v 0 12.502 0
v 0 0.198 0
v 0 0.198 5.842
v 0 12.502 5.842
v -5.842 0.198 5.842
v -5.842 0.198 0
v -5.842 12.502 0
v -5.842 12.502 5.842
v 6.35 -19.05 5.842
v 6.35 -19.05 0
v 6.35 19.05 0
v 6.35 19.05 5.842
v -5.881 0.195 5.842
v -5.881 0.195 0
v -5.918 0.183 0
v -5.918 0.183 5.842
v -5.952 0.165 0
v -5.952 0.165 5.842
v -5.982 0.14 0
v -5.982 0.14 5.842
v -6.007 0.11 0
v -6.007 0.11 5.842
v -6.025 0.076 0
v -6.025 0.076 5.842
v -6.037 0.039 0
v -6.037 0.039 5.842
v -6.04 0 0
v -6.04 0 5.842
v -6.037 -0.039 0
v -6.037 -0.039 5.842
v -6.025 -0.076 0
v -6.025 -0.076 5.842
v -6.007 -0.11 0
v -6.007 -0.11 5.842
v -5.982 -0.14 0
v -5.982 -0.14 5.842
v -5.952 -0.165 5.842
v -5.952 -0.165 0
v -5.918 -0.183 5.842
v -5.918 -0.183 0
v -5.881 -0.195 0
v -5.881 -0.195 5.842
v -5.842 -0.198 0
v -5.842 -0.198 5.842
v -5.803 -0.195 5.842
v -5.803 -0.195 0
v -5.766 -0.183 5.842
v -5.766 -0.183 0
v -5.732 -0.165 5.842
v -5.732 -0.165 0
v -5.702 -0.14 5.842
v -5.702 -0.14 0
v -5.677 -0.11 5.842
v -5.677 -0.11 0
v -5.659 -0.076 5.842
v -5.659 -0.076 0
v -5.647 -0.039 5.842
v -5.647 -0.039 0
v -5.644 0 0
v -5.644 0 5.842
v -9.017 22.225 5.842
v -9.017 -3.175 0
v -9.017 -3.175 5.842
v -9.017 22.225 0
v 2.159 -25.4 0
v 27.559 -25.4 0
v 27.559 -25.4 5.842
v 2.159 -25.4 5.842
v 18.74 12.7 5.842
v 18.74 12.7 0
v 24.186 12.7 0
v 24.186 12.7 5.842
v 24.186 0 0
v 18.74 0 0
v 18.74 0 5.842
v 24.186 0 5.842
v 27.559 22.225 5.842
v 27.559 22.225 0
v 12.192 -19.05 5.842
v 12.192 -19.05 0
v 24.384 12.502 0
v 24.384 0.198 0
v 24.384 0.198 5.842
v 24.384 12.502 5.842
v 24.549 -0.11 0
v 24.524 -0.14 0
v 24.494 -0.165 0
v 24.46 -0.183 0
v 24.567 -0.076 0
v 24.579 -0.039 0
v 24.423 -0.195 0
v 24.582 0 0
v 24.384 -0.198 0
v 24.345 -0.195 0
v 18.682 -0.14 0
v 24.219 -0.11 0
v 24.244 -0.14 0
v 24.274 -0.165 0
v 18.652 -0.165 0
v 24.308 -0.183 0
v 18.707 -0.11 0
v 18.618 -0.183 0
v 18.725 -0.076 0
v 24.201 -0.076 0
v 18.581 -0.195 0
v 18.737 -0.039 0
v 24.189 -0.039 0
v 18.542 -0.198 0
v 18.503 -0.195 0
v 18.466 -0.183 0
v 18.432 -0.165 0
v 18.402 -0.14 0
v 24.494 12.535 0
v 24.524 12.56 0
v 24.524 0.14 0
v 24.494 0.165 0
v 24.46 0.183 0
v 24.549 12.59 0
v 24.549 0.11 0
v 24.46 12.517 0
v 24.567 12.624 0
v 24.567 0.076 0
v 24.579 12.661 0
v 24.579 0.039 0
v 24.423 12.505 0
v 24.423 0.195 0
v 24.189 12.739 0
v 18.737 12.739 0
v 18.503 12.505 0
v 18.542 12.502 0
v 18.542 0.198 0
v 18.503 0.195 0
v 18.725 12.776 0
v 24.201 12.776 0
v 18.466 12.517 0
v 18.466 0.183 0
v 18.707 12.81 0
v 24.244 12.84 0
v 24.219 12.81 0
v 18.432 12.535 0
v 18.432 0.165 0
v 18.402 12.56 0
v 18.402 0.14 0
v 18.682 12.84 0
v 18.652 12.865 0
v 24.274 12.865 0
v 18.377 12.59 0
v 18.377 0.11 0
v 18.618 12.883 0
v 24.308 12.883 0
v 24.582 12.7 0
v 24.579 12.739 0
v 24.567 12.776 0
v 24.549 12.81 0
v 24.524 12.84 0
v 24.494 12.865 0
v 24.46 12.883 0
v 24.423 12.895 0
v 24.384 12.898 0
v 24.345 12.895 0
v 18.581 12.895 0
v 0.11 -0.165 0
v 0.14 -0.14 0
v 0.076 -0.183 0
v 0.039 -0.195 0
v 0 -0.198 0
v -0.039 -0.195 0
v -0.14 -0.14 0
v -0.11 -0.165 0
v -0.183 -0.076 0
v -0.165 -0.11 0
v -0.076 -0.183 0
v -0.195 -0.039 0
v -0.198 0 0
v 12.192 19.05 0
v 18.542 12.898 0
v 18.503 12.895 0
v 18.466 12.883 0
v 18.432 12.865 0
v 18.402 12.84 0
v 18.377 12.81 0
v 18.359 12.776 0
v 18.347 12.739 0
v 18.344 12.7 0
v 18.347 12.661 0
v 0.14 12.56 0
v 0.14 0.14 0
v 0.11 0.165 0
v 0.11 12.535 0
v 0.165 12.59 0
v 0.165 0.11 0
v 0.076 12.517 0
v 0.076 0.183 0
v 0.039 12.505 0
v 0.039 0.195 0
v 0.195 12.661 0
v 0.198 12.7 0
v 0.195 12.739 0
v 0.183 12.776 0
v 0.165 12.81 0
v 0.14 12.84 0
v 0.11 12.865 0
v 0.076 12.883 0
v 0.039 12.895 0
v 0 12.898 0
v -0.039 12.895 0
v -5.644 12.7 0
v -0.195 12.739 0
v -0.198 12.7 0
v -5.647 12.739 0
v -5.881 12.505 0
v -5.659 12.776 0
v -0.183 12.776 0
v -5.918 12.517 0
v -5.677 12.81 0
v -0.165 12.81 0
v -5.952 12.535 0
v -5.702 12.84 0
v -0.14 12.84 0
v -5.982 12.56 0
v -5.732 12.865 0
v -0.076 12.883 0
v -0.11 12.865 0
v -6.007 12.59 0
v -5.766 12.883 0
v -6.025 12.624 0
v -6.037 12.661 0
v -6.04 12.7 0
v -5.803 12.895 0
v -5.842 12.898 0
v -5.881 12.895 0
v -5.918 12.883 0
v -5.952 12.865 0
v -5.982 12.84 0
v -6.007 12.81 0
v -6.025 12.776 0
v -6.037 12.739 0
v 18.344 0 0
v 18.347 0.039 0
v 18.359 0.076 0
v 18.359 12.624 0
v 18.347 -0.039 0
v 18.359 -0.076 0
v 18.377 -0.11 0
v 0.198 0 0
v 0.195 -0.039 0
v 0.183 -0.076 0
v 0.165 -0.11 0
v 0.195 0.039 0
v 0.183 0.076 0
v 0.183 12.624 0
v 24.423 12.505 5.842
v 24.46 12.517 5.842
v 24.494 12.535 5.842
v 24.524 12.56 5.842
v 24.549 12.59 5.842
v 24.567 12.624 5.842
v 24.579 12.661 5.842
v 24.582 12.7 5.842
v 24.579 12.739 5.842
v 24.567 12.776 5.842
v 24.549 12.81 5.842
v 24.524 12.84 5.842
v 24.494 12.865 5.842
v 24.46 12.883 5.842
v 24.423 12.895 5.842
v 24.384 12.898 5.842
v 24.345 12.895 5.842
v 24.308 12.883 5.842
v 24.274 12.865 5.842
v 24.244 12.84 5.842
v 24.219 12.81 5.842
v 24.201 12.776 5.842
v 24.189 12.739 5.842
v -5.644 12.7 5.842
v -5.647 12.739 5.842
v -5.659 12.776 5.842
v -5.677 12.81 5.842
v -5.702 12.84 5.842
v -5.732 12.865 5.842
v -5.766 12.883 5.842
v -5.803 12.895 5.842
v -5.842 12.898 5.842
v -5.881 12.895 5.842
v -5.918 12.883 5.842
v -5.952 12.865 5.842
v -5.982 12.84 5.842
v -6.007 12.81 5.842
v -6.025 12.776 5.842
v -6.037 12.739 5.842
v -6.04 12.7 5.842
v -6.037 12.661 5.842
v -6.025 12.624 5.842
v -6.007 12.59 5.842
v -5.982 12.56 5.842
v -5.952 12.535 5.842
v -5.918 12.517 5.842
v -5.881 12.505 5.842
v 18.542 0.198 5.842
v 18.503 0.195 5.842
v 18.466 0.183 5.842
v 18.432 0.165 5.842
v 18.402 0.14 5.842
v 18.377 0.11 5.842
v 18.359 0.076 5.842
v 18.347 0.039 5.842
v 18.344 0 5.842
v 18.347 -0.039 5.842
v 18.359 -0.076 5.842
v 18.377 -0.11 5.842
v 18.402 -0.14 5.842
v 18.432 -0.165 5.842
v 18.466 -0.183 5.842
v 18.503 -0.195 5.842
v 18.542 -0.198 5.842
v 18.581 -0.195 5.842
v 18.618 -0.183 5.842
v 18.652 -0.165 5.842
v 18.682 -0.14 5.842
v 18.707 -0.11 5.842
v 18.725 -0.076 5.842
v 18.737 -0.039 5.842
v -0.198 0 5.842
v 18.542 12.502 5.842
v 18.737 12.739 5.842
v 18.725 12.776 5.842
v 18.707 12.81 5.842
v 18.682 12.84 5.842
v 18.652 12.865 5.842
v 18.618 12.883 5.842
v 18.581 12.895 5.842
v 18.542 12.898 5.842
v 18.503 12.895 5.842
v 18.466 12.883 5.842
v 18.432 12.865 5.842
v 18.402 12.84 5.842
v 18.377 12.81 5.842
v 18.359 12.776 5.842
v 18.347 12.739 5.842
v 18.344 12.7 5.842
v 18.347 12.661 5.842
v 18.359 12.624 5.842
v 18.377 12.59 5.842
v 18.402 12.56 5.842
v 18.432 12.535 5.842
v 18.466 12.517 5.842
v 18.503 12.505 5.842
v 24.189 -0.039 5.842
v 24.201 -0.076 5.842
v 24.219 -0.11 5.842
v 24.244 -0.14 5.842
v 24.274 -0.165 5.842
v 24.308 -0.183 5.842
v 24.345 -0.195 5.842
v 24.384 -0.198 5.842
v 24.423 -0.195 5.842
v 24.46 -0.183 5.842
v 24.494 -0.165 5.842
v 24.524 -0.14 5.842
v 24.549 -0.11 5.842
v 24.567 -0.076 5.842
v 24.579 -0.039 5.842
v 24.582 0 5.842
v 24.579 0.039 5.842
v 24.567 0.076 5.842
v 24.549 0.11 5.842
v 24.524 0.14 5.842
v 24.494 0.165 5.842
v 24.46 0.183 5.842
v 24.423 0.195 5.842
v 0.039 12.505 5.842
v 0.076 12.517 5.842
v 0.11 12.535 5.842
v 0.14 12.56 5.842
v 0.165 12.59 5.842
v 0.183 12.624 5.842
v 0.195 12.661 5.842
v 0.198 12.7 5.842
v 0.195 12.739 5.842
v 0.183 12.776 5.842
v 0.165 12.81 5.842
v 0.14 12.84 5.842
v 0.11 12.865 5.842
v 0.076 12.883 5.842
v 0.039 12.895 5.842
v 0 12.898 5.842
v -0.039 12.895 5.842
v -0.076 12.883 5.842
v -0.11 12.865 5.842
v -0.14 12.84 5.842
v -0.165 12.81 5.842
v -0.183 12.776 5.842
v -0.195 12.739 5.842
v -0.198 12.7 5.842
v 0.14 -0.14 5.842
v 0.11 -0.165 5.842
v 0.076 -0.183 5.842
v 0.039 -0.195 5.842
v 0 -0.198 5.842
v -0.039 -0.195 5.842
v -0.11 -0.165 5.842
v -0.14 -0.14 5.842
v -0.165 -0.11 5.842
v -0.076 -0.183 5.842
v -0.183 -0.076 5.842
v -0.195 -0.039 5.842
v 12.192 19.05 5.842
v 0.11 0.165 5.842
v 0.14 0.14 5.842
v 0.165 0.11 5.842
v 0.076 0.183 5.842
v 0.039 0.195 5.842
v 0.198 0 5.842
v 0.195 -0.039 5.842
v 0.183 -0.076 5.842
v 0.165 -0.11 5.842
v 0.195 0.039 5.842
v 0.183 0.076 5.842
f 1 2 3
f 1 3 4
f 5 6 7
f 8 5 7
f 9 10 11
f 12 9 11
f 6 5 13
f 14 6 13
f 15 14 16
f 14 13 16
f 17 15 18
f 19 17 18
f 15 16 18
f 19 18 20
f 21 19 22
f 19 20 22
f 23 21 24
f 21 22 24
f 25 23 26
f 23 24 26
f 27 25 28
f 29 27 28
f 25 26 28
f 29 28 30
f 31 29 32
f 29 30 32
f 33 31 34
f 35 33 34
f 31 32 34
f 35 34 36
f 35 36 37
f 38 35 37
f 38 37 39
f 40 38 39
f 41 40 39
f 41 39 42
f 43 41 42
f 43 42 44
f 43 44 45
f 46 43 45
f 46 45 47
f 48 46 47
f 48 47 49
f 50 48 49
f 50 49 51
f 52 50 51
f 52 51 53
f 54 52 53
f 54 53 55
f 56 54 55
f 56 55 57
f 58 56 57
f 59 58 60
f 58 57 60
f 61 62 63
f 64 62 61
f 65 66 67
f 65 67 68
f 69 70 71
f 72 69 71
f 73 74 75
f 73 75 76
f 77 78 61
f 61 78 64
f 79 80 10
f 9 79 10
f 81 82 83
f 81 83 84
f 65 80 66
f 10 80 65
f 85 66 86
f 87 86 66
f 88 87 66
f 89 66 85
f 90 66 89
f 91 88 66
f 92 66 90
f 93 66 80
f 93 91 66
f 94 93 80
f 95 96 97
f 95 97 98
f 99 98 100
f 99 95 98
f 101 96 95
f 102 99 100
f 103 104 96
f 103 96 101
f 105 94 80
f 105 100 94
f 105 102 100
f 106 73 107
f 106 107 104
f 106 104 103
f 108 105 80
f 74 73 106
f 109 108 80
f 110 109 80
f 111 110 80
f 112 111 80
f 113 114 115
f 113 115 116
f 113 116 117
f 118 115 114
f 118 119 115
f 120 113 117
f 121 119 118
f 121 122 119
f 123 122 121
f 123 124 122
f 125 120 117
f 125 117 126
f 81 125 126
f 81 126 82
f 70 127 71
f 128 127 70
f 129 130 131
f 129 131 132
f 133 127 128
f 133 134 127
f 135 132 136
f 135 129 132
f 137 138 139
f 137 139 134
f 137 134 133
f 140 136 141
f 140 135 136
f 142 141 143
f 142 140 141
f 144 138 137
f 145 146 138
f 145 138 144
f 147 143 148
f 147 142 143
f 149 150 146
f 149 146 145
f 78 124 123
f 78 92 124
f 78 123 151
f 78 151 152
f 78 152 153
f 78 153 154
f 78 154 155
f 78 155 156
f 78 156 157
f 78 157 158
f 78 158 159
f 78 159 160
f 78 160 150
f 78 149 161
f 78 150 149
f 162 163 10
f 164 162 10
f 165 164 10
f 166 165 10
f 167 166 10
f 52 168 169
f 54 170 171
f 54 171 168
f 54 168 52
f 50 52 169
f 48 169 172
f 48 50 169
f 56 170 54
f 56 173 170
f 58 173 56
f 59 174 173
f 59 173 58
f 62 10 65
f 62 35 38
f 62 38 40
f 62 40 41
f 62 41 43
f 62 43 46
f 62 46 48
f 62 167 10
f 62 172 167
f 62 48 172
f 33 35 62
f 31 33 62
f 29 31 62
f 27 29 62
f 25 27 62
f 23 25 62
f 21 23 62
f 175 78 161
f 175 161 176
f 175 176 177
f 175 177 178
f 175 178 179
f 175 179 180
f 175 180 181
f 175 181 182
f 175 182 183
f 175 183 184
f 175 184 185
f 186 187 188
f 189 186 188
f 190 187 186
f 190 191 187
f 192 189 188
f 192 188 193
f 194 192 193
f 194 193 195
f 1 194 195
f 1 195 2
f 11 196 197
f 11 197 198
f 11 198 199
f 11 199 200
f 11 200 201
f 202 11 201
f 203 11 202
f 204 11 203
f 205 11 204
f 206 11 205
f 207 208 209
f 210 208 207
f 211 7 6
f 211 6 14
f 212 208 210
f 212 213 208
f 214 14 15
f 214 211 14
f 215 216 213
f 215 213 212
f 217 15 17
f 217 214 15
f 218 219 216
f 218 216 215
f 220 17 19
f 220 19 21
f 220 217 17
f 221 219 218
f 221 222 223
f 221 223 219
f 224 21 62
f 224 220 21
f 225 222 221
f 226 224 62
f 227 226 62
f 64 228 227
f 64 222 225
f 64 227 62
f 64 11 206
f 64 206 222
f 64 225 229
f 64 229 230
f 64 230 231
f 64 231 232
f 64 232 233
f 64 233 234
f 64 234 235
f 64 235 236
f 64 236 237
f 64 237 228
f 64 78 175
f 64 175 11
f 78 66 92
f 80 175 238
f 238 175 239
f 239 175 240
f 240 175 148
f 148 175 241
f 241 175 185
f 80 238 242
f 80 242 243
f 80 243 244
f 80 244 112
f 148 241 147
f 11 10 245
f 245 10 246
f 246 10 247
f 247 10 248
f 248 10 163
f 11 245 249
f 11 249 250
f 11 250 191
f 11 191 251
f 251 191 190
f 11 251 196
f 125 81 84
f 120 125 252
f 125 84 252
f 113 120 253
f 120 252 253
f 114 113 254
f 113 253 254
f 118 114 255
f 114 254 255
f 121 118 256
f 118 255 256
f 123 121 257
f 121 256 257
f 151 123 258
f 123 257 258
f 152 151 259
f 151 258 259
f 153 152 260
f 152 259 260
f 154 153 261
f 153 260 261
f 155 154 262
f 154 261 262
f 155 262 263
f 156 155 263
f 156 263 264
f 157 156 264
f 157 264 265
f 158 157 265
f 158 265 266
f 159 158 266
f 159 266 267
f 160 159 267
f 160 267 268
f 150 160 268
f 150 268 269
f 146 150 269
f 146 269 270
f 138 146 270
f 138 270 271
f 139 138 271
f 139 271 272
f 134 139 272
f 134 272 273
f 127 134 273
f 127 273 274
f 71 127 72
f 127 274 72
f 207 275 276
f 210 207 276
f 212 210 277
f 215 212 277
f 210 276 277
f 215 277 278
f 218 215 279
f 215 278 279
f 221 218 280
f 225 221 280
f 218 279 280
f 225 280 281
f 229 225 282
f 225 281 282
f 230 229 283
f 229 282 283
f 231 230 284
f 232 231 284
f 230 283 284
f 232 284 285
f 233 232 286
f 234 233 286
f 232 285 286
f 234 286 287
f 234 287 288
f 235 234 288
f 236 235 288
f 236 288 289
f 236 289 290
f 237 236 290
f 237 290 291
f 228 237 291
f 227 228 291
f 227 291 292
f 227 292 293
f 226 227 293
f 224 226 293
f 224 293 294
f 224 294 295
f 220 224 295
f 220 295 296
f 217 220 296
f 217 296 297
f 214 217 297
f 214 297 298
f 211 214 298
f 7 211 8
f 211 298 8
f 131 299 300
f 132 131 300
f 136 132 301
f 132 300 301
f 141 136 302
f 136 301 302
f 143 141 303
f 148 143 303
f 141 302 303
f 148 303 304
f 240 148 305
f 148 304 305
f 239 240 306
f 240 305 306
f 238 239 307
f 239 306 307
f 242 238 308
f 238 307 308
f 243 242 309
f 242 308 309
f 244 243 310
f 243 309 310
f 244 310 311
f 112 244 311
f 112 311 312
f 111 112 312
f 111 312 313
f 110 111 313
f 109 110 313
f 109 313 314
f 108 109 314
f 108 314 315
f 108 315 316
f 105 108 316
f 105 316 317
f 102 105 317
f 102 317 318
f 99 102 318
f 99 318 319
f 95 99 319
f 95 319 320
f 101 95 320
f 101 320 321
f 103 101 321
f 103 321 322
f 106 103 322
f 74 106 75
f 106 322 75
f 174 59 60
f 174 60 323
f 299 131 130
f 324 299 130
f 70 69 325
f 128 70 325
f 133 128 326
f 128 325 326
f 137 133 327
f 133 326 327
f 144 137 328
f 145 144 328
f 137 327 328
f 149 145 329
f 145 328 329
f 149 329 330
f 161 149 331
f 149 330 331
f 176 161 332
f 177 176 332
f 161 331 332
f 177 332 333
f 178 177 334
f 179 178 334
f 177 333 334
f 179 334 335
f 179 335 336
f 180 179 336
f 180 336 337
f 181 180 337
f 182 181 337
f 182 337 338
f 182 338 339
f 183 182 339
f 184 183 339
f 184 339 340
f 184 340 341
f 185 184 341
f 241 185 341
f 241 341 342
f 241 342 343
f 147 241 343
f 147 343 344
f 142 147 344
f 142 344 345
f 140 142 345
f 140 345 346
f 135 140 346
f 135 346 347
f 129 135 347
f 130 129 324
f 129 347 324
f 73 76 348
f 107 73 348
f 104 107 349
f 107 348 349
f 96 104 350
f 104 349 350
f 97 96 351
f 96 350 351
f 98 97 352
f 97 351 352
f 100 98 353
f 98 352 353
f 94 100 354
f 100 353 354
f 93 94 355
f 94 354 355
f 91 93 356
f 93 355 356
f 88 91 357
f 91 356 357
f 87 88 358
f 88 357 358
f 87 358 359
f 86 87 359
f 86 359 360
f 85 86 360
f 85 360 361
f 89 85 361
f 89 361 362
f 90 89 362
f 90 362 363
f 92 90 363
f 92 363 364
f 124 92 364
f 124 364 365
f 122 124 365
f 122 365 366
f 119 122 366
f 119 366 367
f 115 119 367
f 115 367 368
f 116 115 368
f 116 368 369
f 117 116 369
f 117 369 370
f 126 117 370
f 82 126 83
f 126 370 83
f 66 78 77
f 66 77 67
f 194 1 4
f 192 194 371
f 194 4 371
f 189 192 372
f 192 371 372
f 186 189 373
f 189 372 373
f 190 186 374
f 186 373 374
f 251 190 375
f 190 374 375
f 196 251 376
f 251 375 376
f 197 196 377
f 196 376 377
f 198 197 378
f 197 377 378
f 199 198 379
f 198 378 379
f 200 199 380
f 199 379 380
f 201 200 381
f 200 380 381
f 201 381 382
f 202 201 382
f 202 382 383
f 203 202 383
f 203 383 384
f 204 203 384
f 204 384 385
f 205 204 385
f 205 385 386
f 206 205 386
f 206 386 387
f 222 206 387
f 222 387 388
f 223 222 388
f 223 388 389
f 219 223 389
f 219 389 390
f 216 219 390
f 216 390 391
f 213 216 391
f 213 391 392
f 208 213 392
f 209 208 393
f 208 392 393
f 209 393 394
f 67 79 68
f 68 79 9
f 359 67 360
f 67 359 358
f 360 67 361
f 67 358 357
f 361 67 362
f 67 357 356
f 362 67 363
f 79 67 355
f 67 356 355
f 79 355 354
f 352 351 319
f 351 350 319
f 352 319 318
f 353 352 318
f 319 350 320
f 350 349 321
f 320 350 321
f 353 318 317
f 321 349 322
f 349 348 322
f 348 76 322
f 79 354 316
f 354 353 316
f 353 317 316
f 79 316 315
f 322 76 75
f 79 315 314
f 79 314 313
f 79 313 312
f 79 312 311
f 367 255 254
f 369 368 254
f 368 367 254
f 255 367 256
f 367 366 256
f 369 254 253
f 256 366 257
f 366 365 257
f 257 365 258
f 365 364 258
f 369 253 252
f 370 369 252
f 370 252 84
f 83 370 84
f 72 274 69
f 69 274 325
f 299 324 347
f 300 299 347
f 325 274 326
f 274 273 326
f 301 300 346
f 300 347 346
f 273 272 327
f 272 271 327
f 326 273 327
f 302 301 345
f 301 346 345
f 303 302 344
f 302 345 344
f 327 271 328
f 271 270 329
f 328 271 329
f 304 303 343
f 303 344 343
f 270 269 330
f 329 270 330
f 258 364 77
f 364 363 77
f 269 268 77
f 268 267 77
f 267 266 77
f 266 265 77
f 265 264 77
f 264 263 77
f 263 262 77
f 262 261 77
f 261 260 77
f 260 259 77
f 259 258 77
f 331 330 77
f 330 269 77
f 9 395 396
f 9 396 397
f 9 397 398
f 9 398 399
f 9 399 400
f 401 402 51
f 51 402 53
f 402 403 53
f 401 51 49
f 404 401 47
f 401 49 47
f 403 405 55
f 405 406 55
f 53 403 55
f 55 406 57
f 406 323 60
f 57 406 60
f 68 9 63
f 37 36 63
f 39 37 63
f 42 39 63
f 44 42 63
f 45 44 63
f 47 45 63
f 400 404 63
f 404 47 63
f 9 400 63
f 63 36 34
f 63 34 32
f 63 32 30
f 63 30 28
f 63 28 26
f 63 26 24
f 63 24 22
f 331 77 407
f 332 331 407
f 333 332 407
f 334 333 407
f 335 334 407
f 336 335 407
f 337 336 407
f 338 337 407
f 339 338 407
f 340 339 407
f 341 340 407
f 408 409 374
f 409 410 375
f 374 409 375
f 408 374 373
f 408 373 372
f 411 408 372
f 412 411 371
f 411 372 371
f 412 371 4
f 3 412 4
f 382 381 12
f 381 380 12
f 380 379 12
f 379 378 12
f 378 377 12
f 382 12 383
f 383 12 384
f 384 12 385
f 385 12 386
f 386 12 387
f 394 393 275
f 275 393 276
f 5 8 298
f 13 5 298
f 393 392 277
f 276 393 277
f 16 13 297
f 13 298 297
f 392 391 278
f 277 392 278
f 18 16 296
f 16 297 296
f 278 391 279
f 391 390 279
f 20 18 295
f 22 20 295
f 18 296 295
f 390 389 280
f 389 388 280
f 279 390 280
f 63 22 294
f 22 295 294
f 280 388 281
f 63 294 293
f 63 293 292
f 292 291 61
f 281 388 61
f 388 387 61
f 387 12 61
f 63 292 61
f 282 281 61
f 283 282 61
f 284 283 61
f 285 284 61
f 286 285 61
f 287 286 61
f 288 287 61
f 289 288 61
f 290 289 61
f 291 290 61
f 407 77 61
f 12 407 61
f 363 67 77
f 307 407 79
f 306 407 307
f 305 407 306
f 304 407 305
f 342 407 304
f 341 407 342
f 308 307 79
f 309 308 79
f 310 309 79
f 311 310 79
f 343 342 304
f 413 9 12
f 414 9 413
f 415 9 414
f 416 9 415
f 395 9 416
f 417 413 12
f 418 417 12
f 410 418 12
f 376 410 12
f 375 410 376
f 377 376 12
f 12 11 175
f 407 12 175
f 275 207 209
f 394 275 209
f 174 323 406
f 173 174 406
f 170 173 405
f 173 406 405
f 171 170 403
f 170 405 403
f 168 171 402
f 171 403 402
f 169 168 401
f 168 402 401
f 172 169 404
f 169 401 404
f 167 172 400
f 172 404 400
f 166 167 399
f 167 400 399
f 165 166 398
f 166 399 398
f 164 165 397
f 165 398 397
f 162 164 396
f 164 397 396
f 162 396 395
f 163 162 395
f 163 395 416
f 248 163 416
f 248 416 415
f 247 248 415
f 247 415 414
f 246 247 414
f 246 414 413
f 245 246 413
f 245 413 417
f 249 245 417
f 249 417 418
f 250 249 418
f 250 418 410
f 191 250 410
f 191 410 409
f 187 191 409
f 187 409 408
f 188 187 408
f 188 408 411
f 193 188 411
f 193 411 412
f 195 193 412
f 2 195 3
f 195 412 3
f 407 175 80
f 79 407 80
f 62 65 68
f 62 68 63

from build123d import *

# Parameters (mm, degrees)
SKETCH1_W           = 5.842
SKETCH1_H           = 12.7
BOSS_EXTRUDE1_DEPTH = 5.842
SKETCH2_R           = 0.1984375
CUT_EXTRUDE1_DEPTH  = 5.842


with BuildPart() as part:
    # Sketch1 → Boss-Extrude1 (new body)
    with BuildSketch(Plane.XY):
        Polygon((2.159, -25.4), (-9.017, -3.175), (-9.017, 22.225), (6.35, 22.225), (12.192, 22.225), (27.559, 22.225), (27.559, -25.4), align=None)
        with Locations((-2.921, 6.35)):
            Rectangle(SKETCH1_W, SKETCH1_H, mode=Mode.SUBTRACT)
        Polygon((12.192, 0), (12.192, -12.7), (12.192, -19.05), (6.35, -19.05), (6.35, -12.7), (6.35, 0), (6.35, 19.05), (12.192, 19.05), align=None, mode=Mode.SUBTRACT)
        with Locations((21.463, 6.35)):
            Rectangle(SKETCH1_W, SKETCH1_H, mode=Mode.SUBTRACT)
    extrude(amount=BOSS_EXTRUDE1_DEPTH)

    # Sketch2 → Cut-Extrude1 (cut)
    with BuildSketch(Plane.XY.offset(5.842)):
        with Locations((-5.842, 12.7)):
            Circle(SKETCH2_R)
        with Locations((0, 12.7)):
            Circle(SKETCH2_R)
        Circle(SKETCH2_R)
        with Locations((-5.842, 0)):
            Circle(SKETCH2_R)
        with Locations((24.384, 0)):
            Circle(SKETCH2_R)
        with Locations((18.542, 0)):
            Circle(SKETCH2_R)
        with Locations((18.542, 12.7)):
            Circle(SKETCH2_R)
        with Locations((24.384, 12.7)):
            Circle(SKETCH2_R)
    extrude(amount=-CUT_EXTRUDE1_DEPTH, mode=Mode.SUBTRACT)


solid = part.part
